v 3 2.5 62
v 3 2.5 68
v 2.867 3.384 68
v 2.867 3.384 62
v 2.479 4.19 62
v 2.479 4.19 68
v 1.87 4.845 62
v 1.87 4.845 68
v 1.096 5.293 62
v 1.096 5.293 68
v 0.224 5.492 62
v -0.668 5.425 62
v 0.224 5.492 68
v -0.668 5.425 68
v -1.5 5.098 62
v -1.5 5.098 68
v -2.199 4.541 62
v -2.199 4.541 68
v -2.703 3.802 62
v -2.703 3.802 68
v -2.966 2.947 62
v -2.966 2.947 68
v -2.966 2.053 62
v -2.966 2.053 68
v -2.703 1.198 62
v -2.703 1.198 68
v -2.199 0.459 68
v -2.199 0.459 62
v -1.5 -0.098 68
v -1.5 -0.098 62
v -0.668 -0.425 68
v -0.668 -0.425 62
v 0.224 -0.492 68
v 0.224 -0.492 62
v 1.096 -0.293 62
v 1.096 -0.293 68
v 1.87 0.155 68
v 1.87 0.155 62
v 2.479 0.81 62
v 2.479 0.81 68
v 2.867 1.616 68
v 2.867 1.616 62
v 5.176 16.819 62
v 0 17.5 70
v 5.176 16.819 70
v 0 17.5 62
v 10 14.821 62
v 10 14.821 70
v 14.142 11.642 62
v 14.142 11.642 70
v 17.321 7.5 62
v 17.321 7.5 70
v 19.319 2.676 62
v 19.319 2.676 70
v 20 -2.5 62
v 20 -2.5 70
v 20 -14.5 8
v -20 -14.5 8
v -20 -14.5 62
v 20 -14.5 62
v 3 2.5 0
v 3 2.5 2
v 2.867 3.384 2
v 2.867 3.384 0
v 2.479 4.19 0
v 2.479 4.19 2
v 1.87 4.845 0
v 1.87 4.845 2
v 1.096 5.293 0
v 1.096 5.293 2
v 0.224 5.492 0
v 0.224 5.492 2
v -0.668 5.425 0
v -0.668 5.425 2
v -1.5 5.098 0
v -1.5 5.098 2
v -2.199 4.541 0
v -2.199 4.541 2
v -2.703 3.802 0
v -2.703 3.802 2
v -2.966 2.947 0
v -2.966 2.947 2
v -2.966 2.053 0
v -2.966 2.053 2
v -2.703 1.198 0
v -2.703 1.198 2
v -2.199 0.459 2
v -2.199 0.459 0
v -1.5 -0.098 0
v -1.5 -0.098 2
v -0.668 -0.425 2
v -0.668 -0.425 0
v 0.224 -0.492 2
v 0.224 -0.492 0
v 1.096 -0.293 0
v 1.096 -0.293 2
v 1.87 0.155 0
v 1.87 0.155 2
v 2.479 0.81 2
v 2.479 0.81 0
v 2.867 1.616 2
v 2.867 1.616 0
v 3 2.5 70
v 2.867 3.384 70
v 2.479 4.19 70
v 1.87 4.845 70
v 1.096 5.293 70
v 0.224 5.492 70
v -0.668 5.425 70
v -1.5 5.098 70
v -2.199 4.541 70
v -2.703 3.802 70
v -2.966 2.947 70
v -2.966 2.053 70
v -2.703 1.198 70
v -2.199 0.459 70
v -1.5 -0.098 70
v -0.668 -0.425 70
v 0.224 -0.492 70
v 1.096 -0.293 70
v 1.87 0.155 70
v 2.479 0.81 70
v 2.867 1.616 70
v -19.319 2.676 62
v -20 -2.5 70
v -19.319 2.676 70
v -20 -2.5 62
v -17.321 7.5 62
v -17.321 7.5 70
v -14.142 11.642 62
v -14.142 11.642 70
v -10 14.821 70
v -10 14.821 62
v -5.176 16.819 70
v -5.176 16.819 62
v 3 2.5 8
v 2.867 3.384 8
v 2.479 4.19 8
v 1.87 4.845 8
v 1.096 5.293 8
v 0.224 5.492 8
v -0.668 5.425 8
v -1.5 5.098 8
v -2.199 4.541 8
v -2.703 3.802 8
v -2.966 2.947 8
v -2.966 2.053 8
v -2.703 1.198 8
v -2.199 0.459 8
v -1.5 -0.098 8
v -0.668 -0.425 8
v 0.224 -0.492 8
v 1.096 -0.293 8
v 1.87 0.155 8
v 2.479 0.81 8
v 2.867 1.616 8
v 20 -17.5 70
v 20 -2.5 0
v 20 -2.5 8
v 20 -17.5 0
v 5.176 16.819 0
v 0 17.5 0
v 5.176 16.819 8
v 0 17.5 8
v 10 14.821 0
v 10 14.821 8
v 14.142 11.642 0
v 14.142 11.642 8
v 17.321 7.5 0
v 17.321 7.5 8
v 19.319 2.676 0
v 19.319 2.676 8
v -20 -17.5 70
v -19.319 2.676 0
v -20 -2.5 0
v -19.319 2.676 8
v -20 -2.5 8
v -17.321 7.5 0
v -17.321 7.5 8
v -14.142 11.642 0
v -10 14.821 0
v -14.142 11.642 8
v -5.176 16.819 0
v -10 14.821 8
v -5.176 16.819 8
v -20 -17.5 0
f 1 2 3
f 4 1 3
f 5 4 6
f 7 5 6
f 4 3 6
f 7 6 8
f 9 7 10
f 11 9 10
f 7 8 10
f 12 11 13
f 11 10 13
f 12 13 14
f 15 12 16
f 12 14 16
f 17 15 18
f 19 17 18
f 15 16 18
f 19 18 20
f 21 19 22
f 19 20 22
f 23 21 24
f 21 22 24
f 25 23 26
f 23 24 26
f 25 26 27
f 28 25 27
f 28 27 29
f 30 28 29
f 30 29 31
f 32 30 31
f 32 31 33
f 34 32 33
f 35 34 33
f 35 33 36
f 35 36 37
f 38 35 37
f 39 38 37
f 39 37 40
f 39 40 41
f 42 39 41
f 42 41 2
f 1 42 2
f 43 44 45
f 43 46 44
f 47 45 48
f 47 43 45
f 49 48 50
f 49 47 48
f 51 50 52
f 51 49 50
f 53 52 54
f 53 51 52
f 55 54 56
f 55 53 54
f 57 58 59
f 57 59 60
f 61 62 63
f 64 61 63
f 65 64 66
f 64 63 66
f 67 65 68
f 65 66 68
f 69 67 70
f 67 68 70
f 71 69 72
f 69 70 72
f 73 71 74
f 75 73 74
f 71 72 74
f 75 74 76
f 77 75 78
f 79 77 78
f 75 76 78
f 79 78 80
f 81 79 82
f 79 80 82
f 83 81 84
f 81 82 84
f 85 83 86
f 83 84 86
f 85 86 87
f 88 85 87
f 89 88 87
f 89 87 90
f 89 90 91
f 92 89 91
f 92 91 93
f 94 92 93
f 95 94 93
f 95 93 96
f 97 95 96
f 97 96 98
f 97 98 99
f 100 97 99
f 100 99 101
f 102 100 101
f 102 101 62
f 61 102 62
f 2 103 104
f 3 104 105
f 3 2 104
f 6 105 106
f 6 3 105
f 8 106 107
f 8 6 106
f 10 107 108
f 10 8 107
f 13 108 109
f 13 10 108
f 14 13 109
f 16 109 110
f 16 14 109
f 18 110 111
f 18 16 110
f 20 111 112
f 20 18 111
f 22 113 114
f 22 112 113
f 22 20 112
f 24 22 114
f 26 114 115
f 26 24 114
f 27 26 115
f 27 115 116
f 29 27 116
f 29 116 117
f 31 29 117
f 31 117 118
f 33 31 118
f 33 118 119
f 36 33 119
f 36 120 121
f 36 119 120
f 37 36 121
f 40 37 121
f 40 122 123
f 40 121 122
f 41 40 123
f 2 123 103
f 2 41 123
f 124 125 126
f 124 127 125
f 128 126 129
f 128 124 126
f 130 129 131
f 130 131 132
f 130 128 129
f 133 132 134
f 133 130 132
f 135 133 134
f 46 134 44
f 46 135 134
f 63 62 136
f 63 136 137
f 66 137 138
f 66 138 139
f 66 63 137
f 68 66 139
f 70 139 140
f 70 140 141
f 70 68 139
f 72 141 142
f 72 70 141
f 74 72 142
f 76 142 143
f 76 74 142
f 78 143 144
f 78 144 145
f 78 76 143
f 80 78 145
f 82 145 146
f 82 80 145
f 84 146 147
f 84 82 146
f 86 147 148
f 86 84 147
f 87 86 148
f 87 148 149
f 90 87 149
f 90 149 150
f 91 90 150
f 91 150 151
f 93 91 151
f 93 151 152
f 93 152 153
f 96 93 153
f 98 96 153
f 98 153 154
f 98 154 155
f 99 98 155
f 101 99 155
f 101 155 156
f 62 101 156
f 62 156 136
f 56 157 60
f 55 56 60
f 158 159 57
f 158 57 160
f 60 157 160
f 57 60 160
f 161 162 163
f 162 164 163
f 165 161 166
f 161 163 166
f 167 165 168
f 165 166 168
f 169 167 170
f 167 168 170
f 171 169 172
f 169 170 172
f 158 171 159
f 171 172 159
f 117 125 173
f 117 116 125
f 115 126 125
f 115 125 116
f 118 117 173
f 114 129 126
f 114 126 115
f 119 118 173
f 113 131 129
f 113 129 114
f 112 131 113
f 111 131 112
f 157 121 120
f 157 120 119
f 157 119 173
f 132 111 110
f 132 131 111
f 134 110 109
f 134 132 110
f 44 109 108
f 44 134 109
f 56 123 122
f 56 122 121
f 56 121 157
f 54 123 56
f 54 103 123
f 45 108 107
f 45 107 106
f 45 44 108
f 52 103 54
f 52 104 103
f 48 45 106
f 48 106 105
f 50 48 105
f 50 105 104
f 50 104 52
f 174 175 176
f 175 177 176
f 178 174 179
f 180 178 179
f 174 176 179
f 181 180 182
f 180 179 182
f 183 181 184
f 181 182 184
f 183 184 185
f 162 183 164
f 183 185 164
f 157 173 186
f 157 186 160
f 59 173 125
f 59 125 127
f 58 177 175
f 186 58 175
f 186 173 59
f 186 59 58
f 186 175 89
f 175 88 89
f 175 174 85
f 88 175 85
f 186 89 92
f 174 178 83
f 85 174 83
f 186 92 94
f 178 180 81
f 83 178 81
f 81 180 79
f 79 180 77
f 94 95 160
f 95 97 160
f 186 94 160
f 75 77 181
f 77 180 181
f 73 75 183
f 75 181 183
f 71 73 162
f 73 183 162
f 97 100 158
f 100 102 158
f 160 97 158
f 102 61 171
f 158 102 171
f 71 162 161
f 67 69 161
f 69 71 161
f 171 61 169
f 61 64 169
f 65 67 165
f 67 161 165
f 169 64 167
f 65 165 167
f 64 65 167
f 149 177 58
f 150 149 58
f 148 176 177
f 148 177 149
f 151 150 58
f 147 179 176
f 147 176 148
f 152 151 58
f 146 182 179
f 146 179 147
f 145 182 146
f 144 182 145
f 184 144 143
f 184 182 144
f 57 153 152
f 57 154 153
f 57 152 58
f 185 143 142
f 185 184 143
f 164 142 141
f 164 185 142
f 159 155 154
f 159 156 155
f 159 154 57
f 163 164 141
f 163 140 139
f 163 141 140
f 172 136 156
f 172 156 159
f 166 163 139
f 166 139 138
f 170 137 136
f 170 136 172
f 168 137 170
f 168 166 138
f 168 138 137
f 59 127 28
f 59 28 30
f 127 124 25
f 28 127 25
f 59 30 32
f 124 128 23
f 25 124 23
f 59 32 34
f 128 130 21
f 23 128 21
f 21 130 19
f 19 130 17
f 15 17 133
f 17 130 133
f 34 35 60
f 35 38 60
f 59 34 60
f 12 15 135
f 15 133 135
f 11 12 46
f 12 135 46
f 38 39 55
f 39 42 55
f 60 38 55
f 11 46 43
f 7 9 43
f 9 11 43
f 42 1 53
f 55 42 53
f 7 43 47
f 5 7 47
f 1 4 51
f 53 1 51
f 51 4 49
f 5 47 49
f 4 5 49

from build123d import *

# Parameters (mm, degrees)
F0_W     = 40
F0_H     = 35
F0_R     = 3
F1_DEPTH = 8
F2_DEPTH = 2
F3_W     = 40
F3_H     = 27
F4_DEPTH = 3
F5_R     = 20
F6_R     = 19.99999
F8_DEPTH = 2.001
F9_DEPTH = 2.001


# Not quite as in the source:
# - a fillet or chamfer is up to 0.001 mm smaller than in the source, because OpenCascade refuses the exact size


with BuildPart() as f1:
    # F0 (on Top) → F1 (new body)
    with BuildSketch(Plane.XY):
        Rectangle(F0_W, F0_H)
        with Locations((0, 2.5)):
            Circle(F0_R, mode=Mode.SUBTRACT)
    extrude(amount=F1_DEPTH)

    # F0 (on Top) → F2 (join)
    with BuildSketch(Plane.XY):
        with Locations((0, 2.5)):
            Circle(F0_R)
    extrude(amount=F2_DEPTH)

    # F3 (on face) → F4 (join)
    with BuildSketch(Plane.XZ.offset(17.5)):
        with Locations((0, 21.5)):
            Rectangle(F3_W, F3_H)
    extrude(amount=-F4_DEPTH)

    # F5
    f5_edges = [f1.edges().sort_by_distance(p)[0] for p in [
        (-20, 17.5, 4),
    ]]
    fillet(f5_edges, radius=F5_R)

    # F6 (radius 20 in the source; OpenCascade refuses exactly that, so slightly less here)
    f6_edges = [f1.edges().sort_by_distance(p)[0] for p in [
        (20, 17.5, 4),
    ]]
    fillet(f6_edges, radius=F6_R)

    # F7: F1 across face


with BuildPart() as f1_1:
    add(f1.part)
    add(f1.part.mirror(Plane(origin=(0, -16, 35), x_dir=(1, 0, 0), z_dir=(0, 0, 1))))

    # F8 (cut, through all): a face of the model
    f8_faces = [f1_1.faces().sort_by_distance(p)[0] for p in [
        (0, 2.5, 2),
    ]]
    extrude(f8_faces, amount=-F8_DEPTH, mode=Mode.SUBTRACT)

    # F9 (cut, through all): a face of the model
    f9_faces = [f1_1.faces().sort_by_distance(p)[0] for p in [
        (0, 2.5, 68),
    ]]
    extrude(f9_faces, amount=-F9_DEPTH, mode=Mode.SUBTRACT)


solid = f1_1.part
